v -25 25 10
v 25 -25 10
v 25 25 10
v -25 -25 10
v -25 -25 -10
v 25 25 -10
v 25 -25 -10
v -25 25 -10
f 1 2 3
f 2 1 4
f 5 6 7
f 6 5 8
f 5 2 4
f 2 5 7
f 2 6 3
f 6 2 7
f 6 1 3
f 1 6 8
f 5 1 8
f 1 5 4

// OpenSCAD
// Parameters
body_length = 50; //[25:100:1]
body_width = 50; //[25:100:1]
body_height = 20; //[10:40:1]

// Main Body Module
module main_body() {
  color([0.85, 0.85, 0.8]) // Off-white for 3D printed PLA
  translate([0, 0, 0]) // Centered at origin
    cube([body_length, body_width, body_height], center=true);
}

// Final Model
union() {
  main_body();
}
